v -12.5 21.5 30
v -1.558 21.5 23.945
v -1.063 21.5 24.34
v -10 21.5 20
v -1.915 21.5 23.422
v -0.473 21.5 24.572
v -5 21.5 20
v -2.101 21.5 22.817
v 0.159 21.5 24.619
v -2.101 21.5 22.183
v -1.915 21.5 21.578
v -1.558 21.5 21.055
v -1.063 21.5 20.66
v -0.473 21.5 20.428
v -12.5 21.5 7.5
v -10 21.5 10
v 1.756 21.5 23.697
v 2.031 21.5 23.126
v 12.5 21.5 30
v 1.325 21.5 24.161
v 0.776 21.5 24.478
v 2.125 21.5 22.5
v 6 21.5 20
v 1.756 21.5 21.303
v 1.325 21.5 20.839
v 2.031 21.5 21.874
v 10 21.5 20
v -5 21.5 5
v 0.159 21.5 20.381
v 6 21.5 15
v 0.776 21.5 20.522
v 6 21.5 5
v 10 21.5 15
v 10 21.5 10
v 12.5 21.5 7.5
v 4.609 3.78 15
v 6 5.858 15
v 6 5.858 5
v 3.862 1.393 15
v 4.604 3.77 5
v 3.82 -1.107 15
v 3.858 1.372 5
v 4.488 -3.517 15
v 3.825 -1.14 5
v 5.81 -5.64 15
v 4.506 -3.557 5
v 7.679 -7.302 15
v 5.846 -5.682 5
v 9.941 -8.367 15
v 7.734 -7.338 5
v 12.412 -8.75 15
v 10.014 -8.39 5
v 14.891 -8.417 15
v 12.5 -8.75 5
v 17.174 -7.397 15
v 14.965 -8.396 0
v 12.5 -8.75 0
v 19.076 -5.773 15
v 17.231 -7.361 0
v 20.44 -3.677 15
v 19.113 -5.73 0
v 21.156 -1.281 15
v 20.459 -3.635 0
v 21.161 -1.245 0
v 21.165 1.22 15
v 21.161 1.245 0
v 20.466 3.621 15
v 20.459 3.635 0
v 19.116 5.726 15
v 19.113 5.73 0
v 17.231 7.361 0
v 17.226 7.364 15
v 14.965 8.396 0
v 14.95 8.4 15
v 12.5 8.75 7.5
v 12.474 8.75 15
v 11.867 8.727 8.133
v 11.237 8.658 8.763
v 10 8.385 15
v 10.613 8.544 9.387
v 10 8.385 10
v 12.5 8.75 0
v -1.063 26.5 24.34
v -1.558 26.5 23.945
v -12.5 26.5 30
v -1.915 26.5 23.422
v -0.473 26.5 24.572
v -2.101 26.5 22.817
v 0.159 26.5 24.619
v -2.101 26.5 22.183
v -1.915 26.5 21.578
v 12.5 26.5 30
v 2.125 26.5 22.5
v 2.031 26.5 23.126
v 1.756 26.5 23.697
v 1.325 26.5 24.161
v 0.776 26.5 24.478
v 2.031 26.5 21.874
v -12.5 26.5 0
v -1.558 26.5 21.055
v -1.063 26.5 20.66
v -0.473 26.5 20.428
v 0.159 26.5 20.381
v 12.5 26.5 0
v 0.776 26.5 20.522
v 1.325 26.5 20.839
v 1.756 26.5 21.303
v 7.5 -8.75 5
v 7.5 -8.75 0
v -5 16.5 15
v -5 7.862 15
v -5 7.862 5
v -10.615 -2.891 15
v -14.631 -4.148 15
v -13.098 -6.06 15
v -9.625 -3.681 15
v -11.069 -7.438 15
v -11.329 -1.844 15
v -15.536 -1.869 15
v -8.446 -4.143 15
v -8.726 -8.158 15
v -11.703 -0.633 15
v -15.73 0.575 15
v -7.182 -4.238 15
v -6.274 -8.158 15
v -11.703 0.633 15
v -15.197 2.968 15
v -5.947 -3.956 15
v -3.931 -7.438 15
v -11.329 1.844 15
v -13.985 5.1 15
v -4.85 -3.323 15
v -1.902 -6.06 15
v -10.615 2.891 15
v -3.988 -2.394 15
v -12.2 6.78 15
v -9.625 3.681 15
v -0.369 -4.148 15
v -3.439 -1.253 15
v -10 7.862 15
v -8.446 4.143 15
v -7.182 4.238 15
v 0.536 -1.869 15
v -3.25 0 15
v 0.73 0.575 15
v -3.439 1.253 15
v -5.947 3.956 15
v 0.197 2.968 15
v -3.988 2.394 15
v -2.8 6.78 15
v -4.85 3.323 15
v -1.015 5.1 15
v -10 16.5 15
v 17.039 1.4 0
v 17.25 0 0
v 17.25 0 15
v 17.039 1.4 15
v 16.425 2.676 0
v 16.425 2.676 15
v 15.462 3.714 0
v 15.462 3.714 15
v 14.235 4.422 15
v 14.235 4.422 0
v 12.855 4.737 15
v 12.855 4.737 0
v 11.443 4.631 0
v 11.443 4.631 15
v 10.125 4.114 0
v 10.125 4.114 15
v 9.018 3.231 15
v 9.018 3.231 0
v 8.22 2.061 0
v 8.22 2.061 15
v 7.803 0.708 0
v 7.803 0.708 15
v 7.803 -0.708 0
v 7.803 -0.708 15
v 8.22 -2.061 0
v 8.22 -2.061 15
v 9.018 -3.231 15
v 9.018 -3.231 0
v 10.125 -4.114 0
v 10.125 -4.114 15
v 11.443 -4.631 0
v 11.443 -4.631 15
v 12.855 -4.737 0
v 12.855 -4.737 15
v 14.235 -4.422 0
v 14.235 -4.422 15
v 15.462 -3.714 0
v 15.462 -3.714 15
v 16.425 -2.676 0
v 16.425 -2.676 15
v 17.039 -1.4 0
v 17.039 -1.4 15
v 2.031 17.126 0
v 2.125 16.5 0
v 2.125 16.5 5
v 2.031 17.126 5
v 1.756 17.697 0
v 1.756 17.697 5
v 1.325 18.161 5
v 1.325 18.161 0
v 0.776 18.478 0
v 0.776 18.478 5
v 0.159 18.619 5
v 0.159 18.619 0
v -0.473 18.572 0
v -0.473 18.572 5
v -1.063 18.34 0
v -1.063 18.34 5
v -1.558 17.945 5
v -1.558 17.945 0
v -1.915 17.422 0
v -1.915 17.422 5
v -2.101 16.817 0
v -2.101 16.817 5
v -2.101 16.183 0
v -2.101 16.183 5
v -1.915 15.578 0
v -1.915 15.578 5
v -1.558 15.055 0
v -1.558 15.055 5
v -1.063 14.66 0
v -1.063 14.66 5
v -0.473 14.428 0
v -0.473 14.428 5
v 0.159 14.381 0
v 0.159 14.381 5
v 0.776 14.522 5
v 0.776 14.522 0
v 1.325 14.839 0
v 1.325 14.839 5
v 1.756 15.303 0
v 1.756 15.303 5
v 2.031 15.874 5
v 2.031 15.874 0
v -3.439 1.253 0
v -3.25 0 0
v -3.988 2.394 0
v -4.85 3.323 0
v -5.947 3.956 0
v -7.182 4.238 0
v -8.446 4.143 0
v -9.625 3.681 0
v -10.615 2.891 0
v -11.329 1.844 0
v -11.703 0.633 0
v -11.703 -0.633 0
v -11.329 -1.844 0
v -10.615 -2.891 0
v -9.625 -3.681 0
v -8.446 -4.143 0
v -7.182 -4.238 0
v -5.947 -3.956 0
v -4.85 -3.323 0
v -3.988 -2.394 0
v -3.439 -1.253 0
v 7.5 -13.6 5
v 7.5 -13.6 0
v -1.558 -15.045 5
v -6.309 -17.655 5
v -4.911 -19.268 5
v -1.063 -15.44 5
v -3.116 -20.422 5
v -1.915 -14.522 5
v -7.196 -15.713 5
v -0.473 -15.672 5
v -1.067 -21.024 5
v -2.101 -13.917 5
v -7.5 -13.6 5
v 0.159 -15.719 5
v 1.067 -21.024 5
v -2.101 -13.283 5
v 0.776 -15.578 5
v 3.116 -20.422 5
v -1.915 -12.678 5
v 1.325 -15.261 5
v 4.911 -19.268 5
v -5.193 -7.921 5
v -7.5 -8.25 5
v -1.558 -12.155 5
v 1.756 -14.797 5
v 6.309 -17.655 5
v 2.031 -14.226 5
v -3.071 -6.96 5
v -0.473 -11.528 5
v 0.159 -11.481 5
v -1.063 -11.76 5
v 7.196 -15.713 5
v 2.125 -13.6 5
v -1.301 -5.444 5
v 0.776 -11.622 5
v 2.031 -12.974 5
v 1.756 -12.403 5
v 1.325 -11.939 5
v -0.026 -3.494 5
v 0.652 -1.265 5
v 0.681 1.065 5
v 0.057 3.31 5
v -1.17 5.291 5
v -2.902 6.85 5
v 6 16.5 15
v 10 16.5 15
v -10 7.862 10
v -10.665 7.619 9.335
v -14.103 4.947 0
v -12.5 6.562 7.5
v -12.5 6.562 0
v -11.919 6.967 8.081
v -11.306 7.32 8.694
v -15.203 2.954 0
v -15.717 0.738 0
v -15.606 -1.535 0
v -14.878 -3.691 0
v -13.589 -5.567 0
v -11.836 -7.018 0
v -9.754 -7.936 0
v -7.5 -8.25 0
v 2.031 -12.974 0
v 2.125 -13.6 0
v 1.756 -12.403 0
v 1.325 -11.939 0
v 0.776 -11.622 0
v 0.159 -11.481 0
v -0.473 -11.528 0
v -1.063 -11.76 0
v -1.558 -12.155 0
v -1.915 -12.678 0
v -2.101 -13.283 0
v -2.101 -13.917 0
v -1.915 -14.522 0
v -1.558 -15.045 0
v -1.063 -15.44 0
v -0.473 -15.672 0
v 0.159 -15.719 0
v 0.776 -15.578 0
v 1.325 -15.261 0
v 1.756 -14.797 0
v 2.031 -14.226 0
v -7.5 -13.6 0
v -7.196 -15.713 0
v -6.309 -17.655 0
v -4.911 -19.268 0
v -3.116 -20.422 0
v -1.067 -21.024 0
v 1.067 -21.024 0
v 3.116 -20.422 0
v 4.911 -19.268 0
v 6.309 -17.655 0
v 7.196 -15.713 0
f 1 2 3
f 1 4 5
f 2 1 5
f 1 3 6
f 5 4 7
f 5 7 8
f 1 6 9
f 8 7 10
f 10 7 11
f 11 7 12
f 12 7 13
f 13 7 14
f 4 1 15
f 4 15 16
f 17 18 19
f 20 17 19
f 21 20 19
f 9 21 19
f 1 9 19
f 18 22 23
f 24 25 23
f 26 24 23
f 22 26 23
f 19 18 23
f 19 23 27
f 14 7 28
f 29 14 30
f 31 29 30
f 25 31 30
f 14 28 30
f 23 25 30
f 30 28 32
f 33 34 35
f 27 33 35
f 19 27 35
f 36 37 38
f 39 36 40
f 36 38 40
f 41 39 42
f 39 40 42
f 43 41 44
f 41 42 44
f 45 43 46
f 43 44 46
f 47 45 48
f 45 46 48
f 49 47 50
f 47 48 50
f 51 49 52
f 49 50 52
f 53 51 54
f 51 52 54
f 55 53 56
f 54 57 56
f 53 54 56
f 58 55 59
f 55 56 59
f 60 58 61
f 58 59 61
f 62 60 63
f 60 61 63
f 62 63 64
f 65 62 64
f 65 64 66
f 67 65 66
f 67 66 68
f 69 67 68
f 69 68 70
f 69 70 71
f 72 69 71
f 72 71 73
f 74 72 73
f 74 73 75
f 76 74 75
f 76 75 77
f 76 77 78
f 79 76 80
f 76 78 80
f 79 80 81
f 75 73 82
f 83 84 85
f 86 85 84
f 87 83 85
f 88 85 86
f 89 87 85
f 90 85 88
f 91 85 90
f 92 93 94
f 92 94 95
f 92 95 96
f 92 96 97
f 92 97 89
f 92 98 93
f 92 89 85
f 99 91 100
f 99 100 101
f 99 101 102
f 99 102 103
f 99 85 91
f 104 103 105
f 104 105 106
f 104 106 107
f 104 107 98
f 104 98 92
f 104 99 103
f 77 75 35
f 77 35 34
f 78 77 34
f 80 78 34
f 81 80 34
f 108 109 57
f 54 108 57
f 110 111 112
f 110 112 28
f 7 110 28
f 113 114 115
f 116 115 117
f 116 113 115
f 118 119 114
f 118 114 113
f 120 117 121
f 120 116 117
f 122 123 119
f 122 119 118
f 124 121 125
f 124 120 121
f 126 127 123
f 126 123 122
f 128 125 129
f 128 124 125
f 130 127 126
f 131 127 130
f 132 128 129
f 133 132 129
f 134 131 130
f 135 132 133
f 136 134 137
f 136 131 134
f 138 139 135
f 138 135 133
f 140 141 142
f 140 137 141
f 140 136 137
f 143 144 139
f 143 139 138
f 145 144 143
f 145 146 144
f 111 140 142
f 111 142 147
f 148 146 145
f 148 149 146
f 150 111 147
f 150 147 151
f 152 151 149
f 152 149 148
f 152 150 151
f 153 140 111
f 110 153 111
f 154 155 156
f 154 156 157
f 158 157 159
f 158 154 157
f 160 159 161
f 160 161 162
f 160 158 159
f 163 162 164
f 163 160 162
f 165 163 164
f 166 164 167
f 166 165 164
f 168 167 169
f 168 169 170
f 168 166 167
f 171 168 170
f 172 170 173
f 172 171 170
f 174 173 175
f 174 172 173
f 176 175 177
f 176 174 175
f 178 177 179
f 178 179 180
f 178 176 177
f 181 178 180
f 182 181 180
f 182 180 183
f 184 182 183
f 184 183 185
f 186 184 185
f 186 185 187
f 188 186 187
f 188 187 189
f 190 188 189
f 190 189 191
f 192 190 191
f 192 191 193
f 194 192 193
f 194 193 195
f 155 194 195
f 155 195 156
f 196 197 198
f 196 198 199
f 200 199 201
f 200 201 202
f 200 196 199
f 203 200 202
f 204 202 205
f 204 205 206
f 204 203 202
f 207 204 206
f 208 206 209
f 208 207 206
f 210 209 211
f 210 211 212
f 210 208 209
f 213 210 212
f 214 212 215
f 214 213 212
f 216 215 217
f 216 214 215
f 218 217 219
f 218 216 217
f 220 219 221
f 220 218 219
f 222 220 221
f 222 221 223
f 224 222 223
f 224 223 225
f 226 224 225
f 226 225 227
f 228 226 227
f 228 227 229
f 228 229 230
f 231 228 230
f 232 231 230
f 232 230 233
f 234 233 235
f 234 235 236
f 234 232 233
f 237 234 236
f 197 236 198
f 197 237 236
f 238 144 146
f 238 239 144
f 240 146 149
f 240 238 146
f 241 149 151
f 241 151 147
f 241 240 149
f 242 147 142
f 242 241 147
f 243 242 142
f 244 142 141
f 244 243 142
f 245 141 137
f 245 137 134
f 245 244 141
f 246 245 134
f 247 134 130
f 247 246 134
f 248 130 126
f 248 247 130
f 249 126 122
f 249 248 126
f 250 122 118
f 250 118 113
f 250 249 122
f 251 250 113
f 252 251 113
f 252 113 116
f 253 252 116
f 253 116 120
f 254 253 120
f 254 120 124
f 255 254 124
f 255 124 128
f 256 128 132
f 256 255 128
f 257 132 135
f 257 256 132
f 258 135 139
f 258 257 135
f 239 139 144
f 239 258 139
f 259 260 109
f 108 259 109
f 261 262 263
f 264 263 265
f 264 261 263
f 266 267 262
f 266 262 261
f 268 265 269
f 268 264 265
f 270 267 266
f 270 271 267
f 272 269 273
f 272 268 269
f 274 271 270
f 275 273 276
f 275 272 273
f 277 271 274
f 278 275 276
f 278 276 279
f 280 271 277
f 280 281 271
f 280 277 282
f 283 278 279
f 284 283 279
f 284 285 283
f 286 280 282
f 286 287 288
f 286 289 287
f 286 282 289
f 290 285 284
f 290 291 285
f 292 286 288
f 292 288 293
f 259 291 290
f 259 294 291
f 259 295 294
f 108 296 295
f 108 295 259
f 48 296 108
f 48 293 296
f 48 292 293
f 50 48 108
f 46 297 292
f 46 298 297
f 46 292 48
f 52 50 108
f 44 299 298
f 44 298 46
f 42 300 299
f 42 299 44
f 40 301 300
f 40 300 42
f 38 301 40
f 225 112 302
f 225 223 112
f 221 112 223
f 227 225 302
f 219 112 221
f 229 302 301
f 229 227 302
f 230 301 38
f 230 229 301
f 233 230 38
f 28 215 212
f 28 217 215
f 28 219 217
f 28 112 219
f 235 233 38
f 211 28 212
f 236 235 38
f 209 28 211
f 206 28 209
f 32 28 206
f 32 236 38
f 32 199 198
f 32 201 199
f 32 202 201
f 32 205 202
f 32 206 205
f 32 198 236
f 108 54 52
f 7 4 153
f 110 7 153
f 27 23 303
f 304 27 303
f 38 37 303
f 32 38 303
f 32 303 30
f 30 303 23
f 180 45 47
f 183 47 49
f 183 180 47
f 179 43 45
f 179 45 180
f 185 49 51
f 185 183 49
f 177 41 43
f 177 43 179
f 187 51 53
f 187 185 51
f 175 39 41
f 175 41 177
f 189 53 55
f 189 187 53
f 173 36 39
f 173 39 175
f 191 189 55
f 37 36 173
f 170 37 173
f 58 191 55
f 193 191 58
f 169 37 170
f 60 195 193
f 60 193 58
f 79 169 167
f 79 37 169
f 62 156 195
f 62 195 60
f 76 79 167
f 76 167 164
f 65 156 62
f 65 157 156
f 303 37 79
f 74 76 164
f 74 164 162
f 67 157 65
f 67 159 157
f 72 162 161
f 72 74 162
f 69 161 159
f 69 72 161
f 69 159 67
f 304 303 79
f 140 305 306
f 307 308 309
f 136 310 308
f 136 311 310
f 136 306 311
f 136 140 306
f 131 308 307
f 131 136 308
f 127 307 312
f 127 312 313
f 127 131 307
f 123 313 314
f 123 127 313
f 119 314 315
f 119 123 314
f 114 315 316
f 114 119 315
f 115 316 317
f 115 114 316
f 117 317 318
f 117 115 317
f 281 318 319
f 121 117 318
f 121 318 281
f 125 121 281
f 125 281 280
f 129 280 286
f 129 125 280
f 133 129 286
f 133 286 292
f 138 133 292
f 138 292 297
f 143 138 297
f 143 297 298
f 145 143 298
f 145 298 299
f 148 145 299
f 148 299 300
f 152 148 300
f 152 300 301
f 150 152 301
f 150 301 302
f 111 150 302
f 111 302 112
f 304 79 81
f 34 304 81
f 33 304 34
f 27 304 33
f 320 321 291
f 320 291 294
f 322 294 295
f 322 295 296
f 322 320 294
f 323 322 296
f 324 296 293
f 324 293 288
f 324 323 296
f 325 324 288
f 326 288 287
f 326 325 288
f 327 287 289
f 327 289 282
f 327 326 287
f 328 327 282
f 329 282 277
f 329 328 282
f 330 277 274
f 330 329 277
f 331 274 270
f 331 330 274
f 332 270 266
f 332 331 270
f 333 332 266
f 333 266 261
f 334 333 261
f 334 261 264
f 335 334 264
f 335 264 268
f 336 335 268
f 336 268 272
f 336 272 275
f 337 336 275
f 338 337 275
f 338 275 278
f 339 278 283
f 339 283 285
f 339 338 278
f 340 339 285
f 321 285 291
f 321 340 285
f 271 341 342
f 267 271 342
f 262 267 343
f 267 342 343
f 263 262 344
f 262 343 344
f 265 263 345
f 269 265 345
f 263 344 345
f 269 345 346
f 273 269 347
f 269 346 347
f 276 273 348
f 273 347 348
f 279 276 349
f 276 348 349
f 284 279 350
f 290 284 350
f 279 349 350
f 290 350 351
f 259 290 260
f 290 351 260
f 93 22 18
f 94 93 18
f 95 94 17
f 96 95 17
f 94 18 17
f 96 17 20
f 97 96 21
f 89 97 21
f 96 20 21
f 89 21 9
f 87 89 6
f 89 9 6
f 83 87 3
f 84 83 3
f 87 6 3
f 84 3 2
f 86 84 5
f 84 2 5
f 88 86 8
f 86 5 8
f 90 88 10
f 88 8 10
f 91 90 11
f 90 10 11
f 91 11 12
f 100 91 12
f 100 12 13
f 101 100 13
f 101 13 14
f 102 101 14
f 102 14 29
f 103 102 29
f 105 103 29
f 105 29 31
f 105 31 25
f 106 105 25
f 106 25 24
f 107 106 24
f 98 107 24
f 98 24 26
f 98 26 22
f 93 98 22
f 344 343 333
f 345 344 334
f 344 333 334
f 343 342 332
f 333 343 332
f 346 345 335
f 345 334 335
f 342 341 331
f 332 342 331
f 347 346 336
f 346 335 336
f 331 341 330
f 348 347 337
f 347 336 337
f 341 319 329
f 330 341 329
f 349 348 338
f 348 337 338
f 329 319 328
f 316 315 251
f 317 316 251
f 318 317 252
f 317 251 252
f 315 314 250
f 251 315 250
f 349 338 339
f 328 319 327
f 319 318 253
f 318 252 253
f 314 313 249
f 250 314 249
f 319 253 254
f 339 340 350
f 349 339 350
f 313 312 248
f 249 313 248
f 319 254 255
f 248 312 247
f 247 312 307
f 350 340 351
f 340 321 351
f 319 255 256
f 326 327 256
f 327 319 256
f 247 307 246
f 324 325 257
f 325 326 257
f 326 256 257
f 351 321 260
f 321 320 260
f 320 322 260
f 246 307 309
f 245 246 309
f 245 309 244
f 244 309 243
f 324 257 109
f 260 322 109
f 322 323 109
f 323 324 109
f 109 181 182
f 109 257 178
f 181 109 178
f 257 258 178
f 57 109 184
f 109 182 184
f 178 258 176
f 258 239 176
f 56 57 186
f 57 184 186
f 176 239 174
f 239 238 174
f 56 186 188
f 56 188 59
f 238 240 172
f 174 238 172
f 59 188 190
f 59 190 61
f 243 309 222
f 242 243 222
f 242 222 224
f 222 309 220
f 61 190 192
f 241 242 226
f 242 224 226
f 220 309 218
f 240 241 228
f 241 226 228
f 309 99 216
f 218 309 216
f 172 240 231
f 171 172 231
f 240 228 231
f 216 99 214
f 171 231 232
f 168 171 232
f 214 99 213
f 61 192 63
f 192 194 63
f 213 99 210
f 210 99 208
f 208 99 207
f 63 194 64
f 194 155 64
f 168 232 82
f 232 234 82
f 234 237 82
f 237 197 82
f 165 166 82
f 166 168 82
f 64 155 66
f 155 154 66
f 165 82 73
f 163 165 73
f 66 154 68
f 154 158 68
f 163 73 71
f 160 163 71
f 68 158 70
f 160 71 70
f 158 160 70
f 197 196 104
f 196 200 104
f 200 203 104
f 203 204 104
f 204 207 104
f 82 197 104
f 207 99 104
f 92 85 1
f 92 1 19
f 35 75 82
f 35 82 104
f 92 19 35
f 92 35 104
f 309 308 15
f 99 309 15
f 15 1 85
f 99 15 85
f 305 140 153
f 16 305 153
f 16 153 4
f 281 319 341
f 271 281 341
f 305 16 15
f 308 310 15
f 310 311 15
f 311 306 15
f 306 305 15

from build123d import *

# Parameters (mm, degrees)
F0_R          = 2.125
F0_R_2        = 4.25
F0_R_3        = 4.75
F1_DEPTH      = 5
F2_W          = 25
F2_H          = 5
F3_DEPTH      = 25
F4_R          = 8.25
F4_R_2        = 4.25
F4_R_3        = 8.75
F4_R_4        = 4.75
F5_DEPTH      = 10
F6_R          = 2.125
F7_DEPTH      = 5.001
F8_W          = 5
F8_H          = 13.6379074032
F8_W_2        = 4
F8_H_2        = 15.6423127431
F9_DEPTH      = 10
F10_T1_DEPTH  = 5
F10_T3_DEPTH  = 4
F10_T8_DEPTH  = 17.8584149398
F10_T13_DEPTH = 16.8584149398
F10_T18_DEPTH = 26.4963223431
F10_S19_R     = 8.25
F10_T20_DEPTH = 15
F10_T25_DEPTH = 26.4963223431
F10_S26_R     = 8.25
F10_T27_DEPTH = 15
F10_T32_DEPTH = 25.9731600242
F10_S34_R     = 8.75
F10_T35_DEPTH = 15


# Not quite as in the source:
# - a fillet or chamfer that OpenCascade refuses, or shapes differently, is made with other operations: its cross-section is extruded or revolved along the edge and cut away or added


with BuildPart() as f1:
    # F0 (on Top) → F1 (new body)
    with BuildSketch(Plane.XY):
        with BuildLine():
            Line((12.5, 26.5), (0, 26.5))
            Line((0, 26.5), (-12.5, 26.5))
            Line((-12.5, 26.5), (-12.5, 6.5622023742))
            ThreePointArc((-12.5, 6.5622023742), (-15.3166703137, -2.6385915194), (-7.5, -8.25))
            Line((-7.5, -8.25), (-7.5, -13.6))
            ThreePointArc((-7.5, -13.6), (-5.3033008589, -18.9033008589), (0, -21.1))
            ThreePointArc((0, -21.1), (5.3033008589, -18.9033008589), (7.5, -13.6))
            Line((7.5, -13.6), (7.5, -8.75))
            Line((7.5, -8.75), (12.5, -8.75))
            ThreePointArc((12.5, -8.75), (21.25, 0), (12.5, 8.75))
            Line((12.5, 8.75), (12.5, 26.5))
        make_face()
        with Locations((0, -13.6)):
            Circle(F0_R, mode=Mode.SUBTRACT)
        with Locations((-7.5, 0)):
            Circle(F0_R_2, mode=Mode.SUBTRACT)
        with Locations((12.5, 0)):
            Circle(F0_R_3, mode=Mode.SUBTRACT)
        with Locations((0, 16.5)):
            Circle(F0_R, mode=Mode.SUBTRACT)
    extrude(amount=F1_DEPTH)

    # F2 (on face) → F3 (join)
    with BuildSketch(Plane.XY.offset(5)):
        with Locations((0, 24)):
            Rectangle(F2_W, F2_H)
    extrude(amount=F3_DEPTH)

    # F4 (on face) → F5 (join)
    with BuildSketch(Plane.XY.offset(5)):
        with Locations((-7.5, 0)):
            Circle(F4_R)
        with Locations((-7.5, 0)):
            Circle(F4_R_2, mode=Mode.SUBTRACT)
        with Locations((12.5, 0)):
            Circle(F4_R_3)
        with Locations((12.5, 0)):
            Circle(F4_R_4, mode=Mode.SUBTRACT)
    extrude(amount=F5_DEPTH)

    # F6 (on face) → F7 (cut, through all)
    with BuildSketch(Plane.XZ.offset(-21.5)):
        with Locations((0, 22.5)):
            Circle(F6_R)
    extrude(amount=-F7_DEPTH, mode=Mode.SUBTRACT)

    # F8 (on face) → F9 (join)
    with BuildSketch(Plane.XY.offset(5)):
        with Locations((-7.5, 14.6810462984)):
            Rectangle(F8_W, F8_H)
        with Locations((8, 13.6788436285)):
            Rectangle(F8_W_2, F8_H_2)
    extrude(amount=F9_DEPTH)

    # F10: chamfer of 5 on 4 edges, made by hand

    # F10_s2 → F10_t1 (join)
    with BuildSketch(Plane.YZ.offset(-10)):
        Polygon((21.5, 20), (16.5, 15), (21.5, 15), align=None)
    extrude(amount=F10_T1_DEPTH)

    # F10_s4 → F10_t3 (join)
    with BuildSketch(Plane.YZ.offset(6)):
        Polygon((21.5, 20), (16.5, 15), (21.5, 15), align=None)
    extrude(amount=F10_T3_DEPTH)


with BuildPart() as f10_tool6:
    # F10_s7 → F10_t8 (new body)
    with BuildSketch(Plane.YZ.offset(7.8584149398)):
        Polygon((21.5, 20), (16.5, 15), (21.5, 15), align=None)
    extrude(amount=-F10_T8_DEPTH)

    split(bisect_by=Plane.YZ.offset(6), keep=Keep.TOP)


with BuildPart() as f1_1:
    add(f1.part)

    # F10_t5: union F10_tool6
    add(f10_tool6.part)


with BuildPart() as f10_tool11:
    # F10_s12 → F10_t13 (new body)
    with BuildSketch(Plane.YZ.offset(10)):
        Polygon((21.5, 20), (16.5, 15), (21.5, 15), align=None)
    extrude(amount=-F10_T13_DEPTH)

    split(bisect_by=Plane.YZ.offset(-5), keep=Keep.BOTTOM)


with BuildPart() as f1_2:
    add(f1_1.part)

    # F10_t10: union F10_tool11
    add(f10_tool11.part)


with BuildPart() as f10_tool16:
    # F10_s17 → F10_t18 (new body)
    with BuildSketch(Plane.XZ.offset(-21.5)):
        Polygon((-10, 10), (-15, 5), (-10, 5), align=None)
    extrude(amount=F10_T18_DEPTH)

    # F10_s19 → F10_t20 (cut, symmetric)
    with BuildSketch(Plane.XY.offset(7.5)):
        with Locations((-7.5, 0)):
            Circle(F10_S19_R)
    extrude(amount=F10_T20_DEPTH, both=True, mode=Mode.SUBTRACT)

    split(bisect_by=Plane.YZ.offset(-12.5), keep=Keep.TOP)


with BuildPart() as f1_3:
    add(f1_2.part)

    # F10_t15: union F10_tool16
    add(f10_tool16.part)


with BuildPart() as f10_tool23:
    # F10_s24 → F10_t25 (new body)
    with BuildSketch(Plane.XZ.offset(-21.5)):
        Polygon((-10, 10), (-15, 5), (-10, 5), align=None)
    extrude(amount=F10_T25_DEPTH)

    # F10_s26 → F10_t27 (intersect, symmetric)
    with BuildSketch(Plane.XY.offset(7.5)):
        with Locations((-7.5, 0)):
            Circle(F10_S26_R)
    extrude(amount=F10_T27_DEPTH, both=True, mode=Mode.INTERSECT)

    split(bisect_by=Plane.YZ.offset(-12.5), keep=Keep.BOTTOM)


with BuildPart() as f1_4:
    add(f1_3.part)

    # F10_t22: union F10_tool23
    add(f10_tool23.part)


with BuildPart() as f10_tool30:
    # F10_s31 → F10_t32 (new body)
    with BuildSketch(Plane.XZ.offset(4.4731600242)):
        Polygon((15, 5), (10, 10), (10, 5), align=None)
    extrude(amount=-F10_T32_DEPTH)

    split(bisect_by=Plane.YZ.offset(12.5), keep=Keep.BOTTOM)

    # F10_s34 → F10_t35 (cut, symmetric)
    with BuildSketch(Plane.XY.offset(7.5)):
        with Locations((12.5, 0)):
            Circle(F10_S34_R)
    extrude(amount=F10_T35_DEPTH, both=True, mode=Mode.SUBTRACT)


with BuildPart() as f1_5:
    add(f1_4.part)

    # F10_t29: union F10_tool30
    add(f10_tool30.part)


solid = f1_5.part
